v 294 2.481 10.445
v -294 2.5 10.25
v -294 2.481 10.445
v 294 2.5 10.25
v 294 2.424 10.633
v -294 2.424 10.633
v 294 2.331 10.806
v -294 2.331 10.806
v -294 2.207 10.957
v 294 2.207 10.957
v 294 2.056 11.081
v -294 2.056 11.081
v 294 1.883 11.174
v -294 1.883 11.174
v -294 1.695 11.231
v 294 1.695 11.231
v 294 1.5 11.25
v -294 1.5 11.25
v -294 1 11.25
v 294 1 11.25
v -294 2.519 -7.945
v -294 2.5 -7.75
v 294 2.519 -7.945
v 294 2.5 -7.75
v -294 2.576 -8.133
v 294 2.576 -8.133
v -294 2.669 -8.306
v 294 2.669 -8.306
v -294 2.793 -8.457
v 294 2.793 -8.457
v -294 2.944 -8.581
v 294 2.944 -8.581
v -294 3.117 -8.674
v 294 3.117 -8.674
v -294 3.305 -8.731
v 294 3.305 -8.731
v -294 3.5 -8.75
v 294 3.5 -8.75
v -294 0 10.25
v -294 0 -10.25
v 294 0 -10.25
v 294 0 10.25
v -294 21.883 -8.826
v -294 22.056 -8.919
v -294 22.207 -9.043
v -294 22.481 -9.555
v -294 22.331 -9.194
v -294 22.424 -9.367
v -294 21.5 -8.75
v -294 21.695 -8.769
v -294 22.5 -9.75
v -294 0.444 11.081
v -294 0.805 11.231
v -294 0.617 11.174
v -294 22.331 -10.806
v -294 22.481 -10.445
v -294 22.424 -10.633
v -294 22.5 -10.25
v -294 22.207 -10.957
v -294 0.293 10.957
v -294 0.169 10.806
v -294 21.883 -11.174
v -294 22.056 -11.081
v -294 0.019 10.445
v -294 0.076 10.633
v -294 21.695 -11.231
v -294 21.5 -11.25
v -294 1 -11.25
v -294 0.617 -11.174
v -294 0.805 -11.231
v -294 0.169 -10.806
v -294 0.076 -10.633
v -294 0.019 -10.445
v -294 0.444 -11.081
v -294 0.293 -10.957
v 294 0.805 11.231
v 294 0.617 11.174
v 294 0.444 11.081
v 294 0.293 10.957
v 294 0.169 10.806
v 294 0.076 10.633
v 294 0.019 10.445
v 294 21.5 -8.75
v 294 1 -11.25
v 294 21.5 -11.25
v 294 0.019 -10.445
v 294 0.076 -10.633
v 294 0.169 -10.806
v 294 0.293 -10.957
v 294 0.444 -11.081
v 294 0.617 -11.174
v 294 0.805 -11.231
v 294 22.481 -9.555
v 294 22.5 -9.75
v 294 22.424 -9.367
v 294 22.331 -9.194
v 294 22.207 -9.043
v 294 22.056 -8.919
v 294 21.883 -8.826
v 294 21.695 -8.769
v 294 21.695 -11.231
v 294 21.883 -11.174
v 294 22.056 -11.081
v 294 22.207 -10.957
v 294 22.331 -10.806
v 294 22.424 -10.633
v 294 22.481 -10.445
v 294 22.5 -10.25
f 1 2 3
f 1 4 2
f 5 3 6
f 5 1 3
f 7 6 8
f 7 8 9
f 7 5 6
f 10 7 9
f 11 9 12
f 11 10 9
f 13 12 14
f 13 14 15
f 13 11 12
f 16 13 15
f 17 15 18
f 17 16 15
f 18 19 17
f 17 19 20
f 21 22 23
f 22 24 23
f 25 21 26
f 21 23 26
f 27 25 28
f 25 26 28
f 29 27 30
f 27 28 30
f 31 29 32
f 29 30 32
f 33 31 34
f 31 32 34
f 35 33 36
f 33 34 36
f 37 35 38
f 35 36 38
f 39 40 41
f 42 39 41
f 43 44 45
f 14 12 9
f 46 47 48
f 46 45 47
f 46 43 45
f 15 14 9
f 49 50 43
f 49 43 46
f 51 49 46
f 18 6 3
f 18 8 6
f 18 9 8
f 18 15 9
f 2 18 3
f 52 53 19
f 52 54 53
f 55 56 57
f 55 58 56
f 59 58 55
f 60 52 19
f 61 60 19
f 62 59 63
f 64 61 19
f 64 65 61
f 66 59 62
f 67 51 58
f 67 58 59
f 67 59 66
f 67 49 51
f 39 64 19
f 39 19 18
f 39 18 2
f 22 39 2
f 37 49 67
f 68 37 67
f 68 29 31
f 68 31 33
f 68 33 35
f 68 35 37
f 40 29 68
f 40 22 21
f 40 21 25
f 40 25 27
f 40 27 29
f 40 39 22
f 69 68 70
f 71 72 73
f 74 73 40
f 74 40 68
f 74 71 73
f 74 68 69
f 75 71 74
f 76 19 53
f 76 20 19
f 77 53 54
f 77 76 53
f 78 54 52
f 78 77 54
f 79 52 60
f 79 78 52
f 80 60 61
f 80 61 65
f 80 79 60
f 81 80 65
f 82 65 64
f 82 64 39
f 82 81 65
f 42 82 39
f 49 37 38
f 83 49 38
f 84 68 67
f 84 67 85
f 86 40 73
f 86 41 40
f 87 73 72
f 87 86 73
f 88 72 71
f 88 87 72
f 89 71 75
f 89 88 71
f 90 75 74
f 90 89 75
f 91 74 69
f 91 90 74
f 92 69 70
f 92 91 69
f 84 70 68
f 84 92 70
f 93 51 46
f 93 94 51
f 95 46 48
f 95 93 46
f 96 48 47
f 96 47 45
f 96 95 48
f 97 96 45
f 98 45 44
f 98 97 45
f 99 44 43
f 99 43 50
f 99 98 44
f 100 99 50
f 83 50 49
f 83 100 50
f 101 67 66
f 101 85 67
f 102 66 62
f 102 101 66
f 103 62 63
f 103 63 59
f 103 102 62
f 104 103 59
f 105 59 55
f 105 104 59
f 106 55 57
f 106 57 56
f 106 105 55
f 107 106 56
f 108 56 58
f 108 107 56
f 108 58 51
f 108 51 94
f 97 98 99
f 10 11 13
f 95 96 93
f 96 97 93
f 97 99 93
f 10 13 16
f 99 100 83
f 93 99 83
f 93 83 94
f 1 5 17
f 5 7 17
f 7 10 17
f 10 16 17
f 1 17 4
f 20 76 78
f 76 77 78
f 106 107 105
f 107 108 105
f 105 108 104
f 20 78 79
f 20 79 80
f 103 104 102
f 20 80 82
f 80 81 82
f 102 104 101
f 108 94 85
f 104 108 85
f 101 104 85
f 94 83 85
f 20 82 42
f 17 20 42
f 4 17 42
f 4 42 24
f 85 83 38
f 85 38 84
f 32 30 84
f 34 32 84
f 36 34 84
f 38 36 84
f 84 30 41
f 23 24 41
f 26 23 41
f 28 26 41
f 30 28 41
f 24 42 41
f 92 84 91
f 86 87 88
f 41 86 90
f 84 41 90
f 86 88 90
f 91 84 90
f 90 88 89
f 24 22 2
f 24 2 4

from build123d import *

# Parameters (mm, degrees)
SKETCH1_W           = 588
SKETCH1_H           = 22.5
BOSS_EXTRUDE1_DEPTH = 2.5
SKETCH2_W           = 588
SKETCH2_H           = 2.5
BOSS_EXTRUDE2_DEPTH = 20
FILLET1_R           = 1


with BuildPart() as part:
    # Sketch1 → Boss-Extrude1 (new body)
    with BuildSketch(Plane(origin=(0, 0, 0), x_dir=(1, 0, 0), z_dir=(0, 1, 0))):
        Rectangle(SKETCH1_W, SKETCH1_H)
    extrude(amount=BOSS_EXTRUDE1_DEPTH)

    # Sketch2 → Boss-Extrude2 (add)
    with BuildSketch(Plane(origin=(0, 2.5, 0), x_dir=(1, 0, 0), z_dir=(0, 1, 0))):
        with Locations((0, 10)):
            Rectangle(SKETCH2_W, SKETCH2_H)
    extrude(amount=BOSS_EXTRUDE2_DEPTH)

    # Fillet1
    fillet1_edges = [part.edges().sort_by_distance(p)[0] for p in [
        (0, 2.5, 11.25),
        (0, 2.5, -8.75),
        (0, 22.5, -8.75),
        (0, 22.5, -11.25),
        (0, 0, 11.25),
        (0, 0, -11.25),
    ]]
    fillet(fillet1_edges, radius=FILLET1_R)


solid = part.part
